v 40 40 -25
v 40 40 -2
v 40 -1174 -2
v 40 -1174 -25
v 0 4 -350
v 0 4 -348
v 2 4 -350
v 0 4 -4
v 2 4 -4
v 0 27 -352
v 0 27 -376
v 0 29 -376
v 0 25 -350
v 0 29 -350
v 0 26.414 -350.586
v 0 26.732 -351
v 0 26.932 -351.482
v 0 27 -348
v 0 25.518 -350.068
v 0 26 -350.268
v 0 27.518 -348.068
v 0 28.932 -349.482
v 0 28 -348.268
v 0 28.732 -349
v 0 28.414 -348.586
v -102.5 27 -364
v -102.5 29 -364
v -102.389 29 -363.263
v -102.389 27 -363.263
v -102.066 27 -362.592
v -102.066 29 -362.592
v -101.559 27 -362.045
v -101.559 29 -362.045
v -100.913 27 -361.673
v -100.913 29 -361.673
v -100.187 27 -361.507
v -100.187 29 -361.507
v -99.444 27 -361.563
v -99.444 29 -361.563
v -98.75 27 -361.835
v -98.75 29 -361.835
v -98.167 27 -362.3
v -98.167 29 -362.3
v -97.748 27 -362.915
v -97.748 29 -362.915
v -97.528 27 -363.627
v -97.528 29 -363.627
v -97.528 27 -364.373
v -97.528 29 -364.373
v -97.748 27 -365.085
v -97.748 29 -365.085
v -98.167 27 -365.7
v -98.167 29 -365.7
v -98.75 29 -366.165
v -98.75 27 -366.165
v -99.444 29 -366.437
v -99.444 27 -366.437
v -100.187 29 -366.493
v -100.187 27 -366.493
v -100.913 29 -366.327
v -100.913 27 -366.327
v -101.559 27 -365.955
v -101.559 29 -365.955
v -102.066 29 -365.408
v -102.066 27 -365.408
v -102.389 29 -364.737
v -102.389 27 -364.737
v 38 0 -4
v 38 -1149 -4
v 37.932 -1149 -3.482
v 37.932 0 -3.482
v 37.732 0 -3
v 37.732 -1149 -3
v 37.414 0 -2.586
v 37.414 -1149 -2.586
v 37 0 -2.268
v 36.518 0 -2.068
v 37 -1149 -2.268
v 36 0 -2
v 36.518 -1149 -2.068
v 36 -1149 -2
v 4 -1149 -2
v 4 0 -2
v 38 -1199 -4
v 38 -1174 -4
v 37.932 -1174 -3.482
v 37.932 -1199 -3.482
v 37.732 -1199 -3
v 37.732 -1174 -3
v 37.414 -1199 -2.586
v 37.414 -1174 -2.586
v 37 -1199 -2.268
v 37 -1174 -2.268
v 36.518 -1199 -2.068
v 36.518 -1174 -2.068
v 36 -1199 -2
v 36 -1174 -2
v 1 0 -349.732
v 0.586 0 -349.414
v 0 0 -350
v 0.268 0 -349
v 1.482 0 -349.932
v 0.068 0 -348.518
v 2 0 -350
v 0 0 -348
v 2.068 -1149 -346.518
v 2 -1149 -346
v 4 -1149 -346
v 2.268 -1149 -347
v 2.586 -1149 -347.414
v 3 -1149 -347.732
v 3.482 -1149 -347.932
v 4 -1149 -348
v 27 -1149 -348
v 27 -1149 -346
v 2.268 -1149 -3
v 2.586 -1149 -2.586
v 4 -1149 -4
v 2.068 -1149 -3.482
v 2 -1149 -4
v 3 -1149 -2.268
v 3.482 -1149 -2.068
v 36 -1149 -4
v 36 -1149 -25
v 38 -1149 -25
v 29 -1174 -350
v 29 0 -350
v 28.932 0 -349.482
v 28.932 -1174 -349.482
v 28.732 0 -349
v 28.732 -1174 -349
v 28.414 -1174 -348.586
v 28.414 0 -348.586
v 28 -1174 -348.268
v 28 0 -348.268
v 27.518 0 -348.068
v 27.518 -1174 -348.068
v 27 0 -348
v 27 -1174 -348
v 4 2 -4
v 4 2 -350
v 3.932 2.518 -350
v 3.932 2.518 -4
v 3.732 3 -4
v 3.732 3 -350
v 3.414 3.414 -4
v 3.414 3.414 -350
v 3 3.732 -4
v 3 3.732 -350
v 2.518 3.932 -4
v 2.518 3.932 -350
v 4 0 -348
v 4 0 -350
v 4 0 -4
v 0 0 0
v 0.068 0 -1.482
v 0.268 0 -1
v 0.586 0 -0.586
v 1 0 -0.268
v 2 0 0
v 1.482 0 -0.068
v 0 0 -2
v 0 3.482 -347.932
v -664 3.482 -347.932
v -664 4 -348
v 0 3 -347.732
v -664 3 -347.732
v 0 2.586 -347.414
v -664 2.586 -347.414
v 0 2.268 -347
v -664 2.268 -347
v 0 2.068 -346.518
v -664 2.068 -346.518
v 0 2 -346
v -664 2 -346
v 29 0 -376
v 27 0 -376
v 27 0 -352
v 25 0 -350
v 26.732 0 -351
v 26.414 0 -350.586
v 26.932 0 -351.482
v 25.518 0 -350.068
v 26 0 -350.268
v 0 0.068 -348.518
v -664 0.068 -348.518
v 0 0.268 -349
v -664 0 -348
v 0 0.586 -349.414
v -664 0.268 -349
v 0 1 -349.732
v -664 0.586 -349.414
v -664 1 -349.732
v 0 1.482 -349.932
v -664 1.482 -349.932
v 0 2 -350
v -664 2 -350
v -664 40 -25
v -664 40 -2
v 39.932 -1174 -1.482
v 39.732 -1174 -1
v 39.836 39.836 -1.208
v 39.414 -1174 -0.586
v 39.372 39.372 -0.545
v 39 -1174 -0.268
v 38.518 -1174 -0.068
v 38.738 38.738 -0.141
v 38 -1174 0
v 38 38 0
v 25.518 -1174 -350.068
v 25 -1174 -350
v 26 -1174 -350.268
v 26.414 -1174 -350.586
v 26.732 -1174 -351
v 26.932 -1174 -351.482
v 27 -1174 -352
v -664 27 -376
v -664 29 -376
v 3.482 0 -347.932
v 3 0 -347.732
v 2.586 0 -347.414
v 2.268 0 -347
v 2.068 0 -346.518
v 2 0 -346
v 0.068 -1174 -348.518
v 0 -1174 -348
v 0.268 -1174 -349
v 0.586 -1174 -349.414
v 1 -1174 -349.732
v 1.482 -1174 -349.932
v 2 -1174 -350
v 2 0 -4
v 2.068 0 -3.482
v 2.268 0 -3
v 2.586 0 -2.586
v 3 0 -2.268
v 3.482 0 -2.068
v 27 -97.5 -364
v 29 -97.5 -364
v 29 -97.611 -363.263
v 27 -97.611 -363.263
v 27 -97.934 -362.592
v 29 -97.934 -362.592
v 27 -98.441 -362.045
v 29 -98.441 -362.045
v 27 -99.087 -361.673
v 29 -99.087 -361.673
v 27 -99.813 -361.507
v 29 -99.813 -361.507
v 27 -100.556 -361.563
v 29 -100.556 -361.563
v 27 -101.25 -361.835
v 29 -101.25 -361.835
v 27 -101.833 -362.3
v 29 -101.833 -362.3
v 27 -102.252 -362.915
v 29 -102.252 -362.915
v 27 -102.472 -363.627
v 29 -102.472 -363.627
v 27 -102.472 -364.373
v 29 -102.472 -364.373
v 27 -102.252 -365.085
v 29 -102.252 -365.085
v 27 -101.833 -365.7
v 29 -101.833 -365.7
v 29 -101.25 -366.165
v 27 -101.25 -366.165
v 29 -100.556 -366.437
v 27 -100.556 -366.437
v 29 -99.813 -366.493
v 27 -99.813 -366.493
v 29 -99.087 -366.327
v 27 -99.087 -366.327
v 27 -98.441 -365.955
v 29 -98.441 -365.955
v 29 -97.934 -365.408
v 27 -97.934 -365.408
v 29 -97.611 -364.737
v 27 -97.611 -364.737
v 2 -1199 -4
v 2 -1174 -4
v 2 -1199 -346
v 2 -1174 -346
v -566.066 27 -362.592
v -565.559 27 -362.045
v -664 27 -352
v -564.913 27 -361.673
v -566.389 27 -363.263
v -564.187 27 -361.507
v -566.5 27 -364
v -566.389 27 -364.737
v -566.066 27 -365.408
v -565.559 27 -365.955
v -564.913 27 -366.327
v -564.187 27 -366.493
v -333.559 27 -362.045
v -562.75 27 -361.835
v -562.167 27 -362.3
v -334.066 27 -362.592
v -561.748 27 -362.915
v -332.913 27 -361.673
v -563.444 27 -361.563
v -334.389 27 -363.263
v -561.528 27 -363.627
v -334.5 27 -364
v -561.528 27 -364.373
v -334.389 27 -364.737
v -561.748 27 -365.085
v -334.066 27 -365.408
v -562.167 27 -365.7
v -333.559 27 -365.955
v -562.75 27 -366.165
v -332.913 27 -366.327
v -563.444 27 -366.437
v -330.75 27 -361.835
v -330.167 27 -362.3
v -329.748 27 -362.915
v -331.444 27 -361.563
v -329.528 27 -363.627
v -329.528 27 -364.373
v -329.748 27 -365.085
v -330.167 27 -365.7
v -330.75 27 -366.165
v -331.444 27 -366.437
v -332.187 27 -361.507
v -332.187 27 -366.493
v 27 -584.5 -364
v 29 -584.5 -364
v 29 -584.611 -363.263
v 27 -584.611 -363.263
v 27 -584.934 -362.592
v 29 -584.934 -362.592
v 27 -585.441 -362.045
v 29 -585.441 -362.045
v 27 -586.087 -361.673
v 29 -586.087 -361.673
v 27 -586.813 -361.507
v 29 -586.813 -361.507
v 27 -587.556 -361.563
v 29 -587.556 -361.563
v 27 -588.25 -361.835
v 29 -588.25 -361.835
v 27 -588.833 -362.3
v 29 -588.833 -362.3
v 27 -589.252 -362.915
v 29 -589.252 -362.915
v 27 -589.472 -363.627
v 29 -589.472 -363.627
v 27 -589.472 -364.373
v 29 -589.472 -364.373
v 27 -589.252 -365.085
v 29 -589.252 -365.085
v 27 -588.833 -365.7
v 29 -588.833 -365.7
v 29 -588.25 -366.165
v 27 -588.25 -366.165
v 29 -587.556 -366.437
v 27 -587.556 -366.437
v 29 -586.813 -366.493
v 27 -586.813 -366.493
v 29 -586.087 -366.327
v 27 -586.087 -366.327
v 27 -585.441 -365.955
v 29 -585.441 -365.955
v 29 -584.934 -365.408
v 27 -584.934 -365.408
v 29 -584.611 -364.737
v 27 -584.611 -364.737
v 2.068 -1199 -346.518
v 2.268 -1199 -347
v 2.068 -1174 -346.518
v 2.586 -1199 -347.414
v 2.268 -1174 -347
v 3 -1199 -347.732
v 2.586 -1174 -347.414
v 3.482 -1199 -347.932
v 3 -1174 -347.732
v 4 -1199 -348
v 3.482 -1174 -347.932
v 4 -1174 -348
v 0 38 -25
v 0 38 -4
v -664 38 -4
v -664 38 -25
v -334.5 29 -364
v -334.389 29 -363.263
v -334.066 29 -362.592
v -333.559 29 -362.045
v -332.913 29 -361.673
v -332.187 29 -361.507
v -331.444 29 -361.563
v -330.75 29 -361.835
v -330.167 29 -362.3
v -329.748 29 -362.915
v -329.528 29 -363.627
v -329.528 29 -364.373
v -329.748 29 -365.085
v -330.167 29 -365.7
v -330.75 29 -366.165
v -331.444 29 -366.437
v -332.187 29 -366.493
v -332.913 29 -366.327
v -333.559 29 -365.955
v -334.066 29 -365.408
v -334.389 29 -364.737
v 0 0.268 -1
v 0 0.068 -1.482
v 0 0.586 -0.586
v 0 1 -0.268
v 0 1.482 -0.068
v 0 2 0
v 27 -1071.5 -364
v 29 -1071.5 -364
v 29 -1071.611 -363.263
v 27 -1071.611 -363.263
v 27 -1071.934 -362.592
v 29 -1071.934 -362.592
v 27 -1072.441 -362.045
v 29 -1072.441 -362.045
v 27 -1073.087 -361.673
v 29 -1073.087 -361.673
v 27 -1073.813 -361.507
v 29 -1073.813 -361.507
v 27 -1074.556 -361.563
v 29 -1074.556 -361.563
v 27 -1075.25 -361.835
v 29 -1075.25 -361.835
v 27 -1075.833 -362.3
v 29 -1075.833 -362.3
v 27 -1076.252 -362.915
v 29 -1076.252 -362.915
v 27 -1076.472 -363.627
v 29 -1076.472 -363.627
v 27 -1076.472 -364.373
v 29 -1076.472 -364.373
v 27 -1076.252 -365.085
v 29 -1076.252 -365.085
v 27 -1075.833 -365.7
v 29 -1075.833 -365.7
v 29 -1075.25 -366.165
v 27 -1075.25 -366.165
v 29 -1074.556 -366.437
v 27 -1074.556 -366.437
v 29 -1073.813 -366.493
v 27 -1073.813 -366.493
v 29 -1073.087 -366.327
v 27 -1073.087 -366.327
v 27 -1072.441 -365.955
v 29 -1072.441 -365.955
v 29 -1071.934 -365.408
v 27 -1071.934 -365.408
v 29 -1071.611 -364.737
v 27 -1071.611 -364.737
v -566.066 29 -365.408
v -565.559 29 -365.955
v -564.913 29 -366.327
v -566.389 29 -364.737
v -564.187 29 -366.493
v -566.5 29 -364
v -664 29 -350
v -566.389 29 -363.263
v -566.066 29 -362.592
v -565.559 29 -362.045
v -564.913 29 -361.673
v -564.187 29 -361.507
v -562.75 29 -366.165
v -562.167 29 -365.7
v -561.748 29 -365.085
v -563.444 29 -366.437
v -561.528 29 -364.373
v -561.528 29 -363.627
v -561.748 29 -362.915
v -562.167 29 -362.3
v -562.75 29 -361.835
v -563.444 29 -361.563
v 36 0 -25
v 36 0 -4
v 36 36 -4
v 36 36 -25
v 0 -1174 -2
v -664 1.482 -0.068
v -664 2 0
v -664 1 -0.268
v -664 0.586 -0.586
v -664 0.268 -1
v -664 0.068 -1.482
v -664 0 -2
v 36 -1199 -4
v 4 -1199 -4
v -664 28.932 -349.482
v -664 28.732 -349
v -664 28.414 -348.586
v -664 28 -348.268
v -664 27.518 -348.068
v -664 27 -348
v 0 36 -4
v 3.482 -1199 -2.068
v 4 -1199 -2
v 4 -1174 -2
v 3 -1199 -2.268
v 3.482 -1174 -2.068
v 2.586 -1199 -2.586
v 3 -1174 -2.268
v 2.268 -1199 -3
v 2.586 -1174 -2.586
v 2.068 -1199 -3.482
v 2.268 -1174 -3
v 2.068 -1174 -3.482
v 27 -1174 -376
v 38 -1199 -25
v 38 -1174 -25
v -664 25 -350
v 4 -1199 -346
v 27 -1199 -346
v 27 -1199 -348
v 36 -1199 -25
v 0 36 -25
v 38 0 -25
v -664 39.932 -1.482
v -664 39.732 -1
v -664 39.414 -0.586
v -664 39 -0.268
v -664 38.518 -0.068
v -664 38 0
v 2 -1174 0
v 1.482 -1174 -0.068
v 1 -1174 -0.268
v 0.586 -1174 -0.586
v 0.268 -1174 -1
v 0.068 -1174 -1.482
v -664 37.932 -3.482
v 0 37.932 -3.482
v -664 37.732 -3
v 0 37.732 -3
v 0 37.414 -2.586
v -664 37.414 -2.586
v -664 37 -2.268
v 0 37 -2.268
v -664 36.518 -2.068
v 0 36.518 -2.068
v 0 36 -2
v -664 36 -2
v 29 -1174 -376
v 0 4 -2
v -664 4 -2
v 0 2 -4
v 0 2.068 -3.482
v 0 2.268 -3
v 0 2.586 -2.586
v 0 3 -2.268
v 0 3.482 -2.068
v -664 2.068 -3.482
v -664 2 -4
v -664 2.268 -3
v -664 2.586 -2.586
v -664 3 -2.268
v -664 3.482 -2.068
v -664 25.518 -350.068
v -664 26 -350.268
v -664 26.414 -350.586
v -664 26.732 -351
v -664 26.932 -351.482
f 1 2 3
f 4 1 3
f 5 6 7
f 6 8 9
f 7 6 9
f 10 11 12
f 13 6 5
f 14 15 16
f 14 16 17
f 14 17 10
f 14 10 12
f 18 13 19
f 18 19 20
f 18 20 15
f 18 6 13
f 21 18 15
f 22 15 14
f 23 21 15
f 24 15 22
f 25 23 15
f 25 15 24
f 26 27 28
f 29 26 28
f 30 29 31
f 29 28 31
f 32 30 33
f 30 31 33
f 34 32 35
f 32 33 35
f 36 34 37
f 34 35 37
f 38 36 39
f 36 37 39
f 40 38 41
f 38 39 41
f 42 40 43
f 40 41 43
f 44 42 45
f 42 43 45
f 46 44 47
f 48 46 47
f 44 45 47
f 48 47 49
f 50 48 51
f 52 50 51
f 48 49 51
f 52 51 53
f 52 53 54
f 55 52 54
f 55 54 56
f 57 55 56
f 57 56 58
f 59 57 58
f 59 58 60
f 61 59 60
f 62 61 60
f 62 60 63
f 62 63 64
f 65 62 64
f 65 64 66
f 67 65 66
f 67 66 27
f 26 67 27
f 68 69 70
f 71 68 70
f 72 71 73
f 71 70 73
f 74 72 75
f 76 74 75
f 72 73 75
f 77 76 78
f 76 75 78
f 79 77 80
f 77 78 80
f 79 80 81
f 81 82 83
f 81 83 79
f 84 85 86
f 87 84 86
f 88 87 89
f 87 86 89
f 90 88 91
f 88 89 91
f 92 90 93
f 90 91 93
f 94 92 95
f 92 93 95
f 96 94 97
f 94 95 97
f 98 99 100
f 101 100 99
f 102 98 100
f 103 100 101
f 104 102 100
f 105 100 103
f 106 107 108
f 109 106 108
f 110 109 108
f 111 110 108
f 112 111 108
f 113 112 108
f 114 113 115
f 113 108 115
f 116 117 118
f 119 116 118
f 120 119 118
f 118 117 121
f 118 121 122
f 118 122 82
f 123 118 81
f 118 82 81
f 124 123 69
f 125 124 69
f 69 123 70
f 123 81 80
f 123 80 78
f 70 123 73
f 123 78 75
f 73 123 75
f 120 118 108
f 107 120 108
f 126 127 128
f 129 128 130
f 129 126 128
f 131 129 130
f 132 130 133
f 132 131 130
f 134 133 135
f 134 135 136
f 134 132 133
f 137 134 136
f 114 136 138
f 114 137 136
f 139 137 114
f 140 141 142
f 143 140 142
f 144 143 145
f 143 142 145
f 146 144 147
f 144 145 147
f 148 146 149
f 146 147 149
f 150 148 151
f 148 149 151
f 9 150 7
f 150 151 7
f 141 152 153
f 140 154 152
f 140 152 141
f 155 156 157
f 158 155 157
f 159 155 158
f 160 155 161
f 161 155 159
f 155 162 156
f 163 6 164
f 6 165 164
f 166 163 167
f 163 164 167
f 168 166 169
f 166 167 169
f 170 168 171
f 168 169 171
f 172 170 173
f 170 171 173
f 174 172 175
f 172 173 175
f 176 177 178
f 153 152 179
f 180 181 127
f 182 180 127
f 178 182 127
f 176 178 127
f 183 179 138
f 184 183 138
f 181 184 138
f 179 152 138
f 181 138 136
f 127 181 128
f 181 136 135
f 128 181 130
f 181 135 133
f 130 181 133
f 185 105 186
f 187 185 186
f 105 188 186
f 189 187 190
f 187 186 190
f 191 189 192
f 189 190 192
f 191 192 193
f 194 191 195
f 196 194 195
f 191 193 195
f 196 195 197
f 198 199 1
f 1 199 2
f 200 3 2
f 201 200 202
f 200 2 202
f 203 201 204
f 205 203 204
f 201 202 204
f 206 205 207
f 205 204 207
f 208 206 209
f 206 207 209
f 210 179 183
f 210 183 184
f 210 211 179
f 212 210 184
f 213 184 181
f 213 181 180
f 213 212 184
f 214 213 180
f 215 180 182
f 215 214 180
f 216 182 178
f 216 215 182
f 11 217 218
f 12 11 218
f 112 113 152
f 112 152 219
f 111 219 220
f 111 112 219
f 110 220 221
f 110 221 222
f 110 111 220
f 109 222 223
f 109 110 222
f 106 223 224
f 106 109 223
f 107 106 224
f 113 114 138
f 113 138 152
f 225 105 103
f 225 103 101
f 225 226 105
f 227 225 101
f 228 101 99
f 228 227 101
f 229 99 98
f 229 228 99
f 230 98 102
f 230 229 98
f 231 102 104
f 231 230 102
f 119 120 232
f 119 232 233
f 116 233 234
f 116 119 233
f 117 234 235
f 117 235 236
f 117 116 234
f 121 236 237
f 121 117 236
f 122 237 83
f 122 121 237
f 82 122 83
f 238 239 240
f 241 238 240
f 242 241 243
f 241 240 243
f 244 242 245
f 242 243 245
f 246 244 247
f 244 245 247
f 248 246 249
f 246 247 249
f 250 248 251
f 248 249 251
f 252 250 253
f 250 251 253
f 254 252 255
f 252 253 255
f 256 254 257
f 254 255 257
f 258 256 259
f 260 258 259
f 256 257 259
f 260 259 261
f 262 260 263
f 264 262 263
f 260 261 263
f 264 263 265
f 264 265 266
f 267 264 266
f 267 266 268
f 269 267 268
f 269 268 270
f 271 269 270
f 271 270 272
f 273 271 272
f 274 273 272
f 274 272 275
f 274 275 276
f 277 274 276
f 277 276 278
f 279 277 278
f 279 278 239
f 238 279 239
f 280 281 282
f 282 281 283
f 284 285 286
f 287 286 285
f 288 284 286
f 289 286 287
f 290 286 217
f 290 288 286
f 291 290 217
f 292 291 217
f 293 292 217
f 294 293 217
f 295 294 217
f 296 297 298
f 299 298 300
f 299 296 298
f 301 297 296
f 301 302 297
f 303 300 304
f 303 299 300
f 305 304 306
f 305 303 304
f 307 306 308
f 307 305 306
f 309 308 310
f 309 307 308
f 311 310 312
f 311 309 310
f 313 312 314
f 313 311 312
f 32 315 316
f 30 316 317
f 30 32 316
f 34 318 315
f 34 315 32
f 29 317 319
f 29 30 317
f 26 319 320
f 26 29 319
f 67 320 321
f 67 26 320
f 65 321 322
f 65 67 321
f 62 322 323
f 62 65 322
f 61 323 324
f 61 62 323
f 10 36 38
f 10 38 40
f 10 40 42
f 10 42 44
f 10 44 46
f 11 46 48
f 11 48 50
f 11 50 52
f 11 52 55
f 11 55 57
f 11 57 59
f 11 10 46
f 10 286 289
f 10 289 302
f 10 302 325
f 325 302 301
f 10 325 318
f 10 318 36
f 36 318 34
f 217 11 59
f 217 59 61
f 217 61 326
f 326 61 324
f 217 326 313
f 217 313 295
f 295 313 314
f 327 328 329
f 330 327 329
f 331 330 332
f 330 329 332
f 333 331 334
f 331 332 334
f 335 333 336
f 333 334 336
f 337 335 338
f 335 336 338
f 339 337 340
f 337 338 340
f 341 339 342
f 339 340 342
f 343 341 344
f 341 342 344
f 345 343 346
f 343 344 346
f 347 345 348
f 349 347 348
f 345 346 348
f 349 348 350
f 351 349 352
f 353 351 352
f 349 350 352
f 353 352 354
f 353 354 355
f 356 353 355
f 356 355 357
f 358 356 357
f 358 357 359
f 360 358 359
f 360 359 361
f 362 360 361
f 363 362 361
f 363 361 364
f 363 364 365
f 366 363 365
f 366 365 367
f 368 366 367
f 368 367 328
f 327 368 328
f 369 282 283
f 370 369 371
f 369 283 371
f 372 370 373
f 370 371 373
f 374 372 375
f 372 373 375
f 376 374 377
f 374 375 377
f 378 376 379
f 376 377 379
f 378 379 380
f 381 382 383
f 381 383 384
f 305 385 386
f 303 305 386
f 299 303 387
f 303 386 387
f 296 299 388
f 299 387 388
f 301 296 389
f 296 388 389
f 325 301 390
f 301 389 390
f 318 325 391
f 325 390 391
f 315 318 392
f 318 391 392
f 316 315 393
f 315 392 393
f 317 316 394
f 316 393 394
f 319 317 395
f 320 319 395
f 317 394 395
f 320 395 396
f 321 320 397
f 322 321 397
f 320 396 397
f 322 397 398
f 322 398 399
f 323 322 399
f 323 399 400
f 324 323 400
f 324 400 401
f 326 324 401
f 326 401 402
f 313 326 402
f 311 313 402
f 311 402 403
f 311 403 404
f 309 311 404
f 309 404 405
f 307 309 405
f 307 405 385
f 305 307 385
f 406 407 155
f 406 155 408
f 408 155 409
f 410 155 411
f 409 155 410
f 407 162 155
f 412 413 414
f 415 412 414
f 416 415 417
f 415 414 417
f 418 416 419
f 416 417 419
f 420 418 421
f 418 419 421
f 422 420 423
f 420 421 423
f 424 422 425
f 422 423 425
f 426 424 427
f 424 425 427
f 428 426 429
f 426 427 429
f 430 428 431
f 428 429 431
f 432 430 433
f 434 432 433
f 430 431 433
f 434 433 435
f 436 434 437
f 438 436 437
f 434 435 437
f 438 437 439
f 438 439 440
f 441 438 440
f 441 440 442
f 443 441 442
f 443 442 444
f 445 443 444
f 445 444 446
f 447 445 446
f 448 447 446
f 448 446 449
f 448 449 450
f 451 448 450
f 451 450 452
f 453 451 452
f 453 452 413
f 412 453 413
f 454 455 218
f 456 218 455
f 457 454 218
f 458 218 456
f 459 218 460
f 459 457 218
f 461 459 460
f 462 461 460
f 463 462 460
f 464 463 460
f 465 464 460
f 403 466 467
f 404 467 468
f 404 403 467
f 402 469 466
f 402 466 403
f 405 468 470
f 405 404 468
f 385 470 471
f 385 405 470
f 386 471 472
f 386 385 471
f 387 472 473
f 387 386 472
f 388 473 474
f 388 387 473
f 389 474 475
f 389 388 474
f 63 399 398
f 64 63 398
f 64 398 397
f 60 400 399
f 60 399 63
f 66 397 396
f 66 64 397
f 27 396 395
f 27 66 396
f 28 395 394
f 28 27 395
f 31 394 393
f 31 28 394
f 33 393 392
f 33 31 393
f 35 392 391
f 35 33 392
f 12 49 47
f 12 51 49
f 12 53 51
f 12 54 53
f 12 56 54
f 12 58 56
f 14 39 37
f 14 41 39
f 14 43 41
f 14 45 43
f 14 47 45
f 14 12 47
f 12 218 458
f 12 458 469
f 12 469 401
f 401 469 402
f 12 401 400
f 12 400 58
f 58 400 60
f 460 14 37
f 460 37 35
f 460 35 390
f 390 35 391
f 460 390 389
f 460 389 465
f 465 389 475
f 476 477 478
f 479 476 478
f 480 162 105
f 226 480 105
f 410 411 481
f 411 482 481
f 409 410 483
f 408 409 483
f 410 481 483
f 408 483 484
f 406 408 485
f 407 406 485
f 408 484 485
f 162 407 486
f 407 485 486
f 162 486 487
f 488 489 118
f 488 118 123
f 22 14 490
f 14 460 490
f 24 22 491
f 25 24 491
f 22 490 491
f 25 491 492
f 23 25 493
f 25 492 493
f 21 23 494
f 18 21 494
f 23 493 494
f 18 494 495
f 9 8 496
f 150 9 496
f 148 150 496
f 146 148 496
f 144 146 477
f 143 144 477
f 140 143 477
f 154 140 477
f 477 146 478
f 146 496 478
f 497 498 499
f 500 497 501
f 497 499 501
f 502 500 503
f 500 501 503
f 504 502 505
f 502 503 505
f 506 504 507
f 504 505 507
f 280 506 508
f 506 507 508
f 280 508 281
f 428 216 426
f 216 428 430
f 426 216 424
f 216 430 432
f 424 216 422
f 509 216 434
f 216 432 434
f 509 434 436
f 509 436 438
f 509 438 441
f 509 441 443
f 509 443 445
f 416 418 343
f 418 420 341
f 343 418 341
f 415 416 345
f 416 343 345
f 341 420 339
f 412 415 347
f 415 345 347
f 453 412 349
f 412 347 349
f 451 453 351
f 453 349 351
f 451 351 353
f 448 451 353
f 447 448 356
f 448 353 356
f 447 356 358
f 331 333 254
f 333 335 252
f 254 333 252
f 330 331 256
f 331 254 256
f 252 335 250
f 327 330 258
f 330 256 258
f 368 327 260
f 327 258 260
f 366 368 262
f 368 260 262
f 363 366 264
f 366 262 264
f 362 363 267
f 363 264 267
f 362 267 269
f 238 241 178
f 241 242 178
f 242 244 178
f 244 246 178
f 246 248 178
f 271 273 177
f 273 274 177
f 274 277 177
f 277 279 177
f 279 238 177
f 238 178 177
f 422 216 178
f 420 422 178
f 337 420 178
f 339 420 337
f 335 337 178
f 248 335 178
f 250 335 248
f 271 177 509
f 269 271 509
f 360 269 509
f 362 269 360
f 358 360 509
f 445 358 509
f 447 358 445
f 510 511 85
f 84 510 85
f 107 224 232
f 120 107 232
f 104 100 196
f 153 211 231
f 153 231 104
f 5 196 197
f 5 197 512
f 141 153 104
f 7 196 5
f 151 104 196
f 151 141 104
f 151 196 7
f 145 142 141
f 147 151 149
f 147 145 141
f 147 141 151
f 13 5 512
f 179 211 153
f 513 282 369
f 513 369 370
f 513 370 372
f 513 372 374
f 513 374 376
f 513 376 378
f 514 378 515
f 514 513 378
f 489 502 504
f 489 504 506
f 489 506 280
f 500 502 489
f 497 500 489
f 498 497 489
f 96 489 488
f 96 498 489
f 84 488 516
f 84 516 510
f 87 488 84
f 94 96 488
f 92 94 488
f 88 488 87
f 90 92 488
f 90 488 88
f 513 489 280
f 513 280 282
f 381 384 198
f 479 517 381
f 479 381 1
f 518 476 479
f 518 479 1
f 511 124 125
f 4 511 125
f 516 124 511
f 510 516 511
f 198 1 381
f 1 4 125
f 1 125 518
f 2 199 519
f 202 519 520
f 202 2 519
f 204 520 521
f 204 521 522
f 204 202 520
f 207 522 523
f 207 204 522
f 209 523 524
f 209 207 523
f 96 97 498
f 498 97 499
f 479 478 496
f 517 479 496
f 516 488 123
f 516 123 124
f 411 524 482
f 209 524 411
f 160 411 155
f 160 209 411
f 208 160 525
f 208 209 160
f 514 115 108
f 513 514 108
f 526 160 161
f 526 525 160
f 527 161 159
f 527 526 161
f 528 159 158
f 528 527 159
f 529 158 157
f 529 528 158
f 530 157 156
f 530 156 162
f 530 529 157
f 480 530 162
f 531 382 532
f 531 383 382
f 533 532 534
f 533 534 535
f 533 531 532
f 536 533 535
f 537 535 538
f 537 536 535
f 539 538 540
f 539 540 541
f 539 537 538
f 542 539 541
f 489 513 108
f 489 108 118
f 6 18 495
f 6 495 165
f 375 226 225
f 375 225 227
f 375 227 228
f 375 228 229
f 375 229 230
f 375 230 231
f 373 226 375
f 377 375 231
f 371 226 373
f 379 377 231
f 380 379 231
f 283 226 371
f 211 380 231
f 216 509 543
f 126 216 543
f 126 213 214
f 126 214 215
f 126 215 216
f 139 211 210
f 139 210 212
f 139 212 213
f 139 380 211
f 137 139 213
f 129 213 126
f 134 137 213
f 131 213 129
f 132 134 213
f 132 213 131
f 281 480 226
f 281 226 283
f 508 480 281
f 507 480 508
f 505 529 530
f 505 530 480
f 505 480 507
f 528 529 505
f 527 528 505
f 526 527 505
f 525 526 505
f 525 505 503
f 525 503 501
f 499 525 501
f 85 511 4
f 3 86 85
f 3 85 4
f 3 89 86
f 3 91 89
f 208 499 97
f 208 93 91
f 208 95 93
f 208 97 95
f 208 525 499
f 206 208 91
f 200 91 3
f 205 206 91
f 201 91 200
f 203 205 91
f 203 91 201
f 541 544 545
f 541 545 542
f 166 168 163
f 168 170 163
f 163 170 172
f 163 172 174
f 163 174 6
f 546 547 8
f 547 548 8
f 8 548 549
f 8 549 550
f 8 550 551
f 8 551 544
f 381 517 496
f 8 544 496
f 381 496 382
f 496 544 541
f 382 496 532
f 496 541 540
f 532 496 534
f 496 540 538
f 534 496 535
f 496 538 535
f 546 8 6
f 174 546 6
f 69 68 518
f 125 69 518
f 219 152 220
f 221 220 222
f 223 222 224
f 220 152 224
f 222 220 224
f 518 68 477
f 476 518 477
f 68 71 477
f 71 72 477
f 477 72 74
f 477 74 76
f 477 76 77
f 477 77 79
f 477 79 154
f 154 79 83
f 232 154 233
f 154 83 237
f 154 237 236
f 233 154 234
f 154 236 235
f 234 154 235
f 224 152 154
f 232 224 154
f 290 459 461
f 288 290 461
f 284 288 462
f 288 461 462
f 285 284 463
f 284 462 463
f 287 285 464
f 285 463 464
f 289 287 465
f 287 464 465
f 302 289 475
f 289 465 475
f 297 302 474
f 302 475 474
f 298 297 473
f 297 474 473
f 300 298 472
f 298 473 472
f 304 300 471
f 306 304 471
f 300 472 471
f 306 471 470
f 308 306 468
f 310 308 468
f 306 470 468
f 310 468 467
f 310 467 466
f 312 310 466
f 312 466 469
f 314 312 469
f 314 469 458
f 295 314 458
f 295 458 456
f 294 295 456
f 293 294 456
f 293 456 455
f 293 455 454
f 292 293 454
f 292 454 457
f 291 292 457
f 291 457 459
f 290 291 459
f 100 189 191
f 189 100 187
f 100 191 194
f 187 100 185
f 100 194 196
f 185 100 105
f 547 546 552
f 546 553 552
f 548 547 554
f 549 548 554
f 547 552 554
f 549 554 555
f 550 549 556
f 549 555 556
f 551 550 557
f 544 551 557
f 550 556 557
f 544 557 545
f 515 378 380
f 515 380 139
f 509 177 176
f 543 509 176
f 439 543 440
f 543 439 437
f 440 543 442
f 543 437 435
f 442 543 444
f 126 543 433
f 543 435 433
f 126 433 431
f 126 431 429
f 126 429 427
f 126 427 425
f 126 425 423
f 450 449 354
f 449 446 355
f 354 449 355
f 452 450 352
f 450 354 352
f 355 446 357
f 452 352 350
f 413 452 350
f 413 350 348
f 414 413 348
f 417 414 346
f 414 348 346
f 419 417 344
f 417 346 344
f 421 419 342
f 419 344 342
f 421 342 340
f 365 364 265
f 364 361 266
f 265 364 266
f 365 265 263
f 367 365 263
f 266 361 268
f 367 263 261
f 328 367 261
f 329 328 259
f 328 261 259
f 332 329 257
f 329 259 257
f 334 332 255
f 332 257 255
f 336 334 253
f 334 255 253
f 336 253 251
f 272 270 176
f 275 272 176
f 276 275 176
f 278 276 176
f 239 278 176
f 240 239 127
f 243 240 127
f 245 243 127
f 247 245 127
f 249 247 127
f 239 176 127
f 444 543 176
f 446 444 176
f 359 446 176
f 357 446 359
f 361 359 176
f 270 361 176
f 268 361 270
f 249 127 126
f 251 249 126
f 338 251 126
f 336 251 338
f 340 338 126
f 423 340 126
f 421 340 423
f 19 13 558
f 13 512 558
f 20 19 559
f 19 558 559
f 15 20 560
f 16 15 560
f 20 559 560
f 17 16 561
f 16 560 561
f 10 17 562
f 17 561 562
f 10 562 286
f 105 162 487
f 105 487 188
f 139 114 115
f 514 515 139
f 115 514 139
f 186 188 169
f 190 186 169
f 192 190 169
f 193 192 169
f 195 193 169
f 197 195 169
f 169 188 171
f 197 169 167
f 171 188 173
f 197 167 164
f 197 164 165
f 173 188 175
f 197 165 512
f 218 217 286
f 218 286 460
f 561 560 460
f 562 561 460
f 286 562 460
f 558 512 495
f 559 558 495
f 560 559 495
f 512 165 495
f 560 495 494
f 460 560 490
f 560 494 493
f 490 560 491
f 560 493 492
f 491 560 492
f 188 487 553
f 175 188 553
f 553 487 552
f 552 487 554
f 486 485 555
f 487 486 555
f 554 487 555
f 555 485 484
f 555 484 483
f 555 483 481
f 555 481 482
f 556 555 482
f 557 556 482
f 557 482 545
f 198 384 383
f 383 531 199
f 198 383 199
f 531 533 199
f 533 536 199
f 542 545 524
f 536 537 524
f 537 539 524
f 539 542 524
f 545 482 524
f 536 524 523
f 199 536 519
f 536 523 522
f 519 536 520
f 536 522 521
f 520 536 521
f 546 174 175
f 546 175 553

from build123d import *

# Parameters (mm, degrees)
F1_DEPTH       = 1174
F3_DEPTH       = 664
F4_W           = 40
F4_H           = 40
F5_DEPTH       = 4
F6_W           = 4
F6_H           = 4
F7_DEPTH       = 350
F8_R           = 2
F8_2_R         = 2
F8_3_R         = 2
F8_4_R         = 2
F10_DEPTH      = 21
F12_DEPTH      = 25
F12_DEPTH_BACK = 25
F15_D          = 5
F15_ON_F13_D   = 5


with BuildPart() as f1:
    # F0 (on Front) → F1 (new body)
    with BuildSketch(Plane.XZ):
        Polygon((38, -2), (38, -25), (40, -25), (40, 0), (0, 0), (0, -350), (27, -350), (27, -376), (29, -376), (29, -348), (2, -348), (2, -2), align=None)
    extrude(amount=F1_DEPTH)

    # F8
    f8_edges = [f1.edges().sort_by_distance(p)[0] for p in [
        (40, -587, 0),
        (29, -587, -348),
        (2, -587, -348),
        (0, -587, 0),
        (2, -587, -2),
        (38, -587, -2),
        (0, -587, -350),
        (27, -587, -350),
    ]]
    fillet(f8_edges, radius=F8_R)



with BuildPart() as f3:
    # F2 (on Right) → F3 (new body)
    with BuildSketch(Plane.YZ):
        Polygon((38, -2), (38, -25), (40, -25), (40, 0), (0, 0), (0, -350), (27, -350), (27, -376), (29, -376), (29, -348), (2, -348), (2, -2), align=None)
    extrude(amount=-F3_DEPTH)

    # F8#2
    f8_2_edges = [f3.edges().sort_by_distance(p)[0] for p in [
        (-332, 40, 0),
        (-332, 29, -348),
        (-332, 2, -348),
        (-332, 0, 0),
        (-332, 2, -2),
        (-332, 38, -2),
        (-332, 0, -350),
        (-332, 27, -350),
    ]]
    fillet(f8_2_edges, radius=F8_2_R)


with BuildPart() as f5:
    # F4 (on Top) → F5 (new body)
    with BuildSketch(Plane.XY):
        with Locations((20, 20)):
            Rectangle(F4_W, F4_H)
    extrude(amount=-F5_DEPTH)

    # F8#4
    f8_4_edges = [f5.edges().sort_by_distance(p)[0] for p in [
        (40, 20, 0),
        (20, 40, 0),
    ]]
    fillet(f8_4_edges, radius=F8_4_R)


with BuildPart() as f7:
    # F6 (on Top) → F7 (new body)
    with BuildSketch(Plane.XY):
        with Locations((2, 2)):
            Rectangle(F6_W, F6_H)
    extrude(amount=-F7_DEPTH)

    # F8#3
    f8_3_edges = [f7.edges().sort_by_distance(p)[0] for p in [
        (4, 4, -175),
    ]]
    fillet(f8_3_edges, radius=F8_3_R)


with BuildPart() as f10:
    # F9 (on face) → F10 (new body)
    with BuildSketch(Plane(origin=(0, 0, -4), x_dir=(1, 0, 0), z_dir=(0, 0, -1))):
        Polygon((40, -40), (40, 0), (36, 0), (36, -36), (0, -36), (0, -40), align=None)
    extrude(amount=F10_DEPTH)


with BuildPart() as f1_1:
    add(f1.part)

    add(f3.part)  # F12 merges F3

    add(f5.part)  # F12 merges F5

    add(f7.part)  # F12 merges F7

    add(f10.part)  # F12 merges F10
    # F11 (on face) → F12 (join, two sides)
    with BuildSketch(Plane.XZ.offset(1174)) as f12_sk:
        with BuildLine():
            Line((27, -346), (4, -346))
            Line((4, -346), (4, -4))
            Line((4, -4), (36, -4))
            Line((36, -4), (36, -25))
            Line((36, -25), (38, -25))
            Line((38, -25), (38, -4))
            ThreePointArc((38, -4), (37.4142135624, -2.5857864376), (36, -2))
            Line((36, -2), (4, -2))
            ThreePointArc((4, -2), (2.5857864376, -2.5857864376), (2, -4))
            Line((2, -4), (2, -346))
            ThreePointArc((2, -346), (2.5857864376, -347.4142135624), (4, -348))
            Line((4, -348), (27, -348))
            Line((27, -348), (27, -346))
        make_face()
    extrude(amount=F12_DEPTH)
    extrude(f12_sk.sketch, amount=-F12_DEPTH_BACK)

    # F15 (through all)
    with Locations(Plane(origin=(27, 0, 0), x_dir=(0, -1, 0), z_dir=(-1, 0, 0))):
        with Locations((100, -364), (587, -364), (1074, -364)):
            Hole(F15_D / 2)

    # F15 on F13 (through all)
    with Locations(Plane.XZ.offset(-27)):
        with Locations((-100, -364), (-332, -364), (-564, -364)):
            Hole(F15_ON_F13_D / 2)


solid = f1_1.part
